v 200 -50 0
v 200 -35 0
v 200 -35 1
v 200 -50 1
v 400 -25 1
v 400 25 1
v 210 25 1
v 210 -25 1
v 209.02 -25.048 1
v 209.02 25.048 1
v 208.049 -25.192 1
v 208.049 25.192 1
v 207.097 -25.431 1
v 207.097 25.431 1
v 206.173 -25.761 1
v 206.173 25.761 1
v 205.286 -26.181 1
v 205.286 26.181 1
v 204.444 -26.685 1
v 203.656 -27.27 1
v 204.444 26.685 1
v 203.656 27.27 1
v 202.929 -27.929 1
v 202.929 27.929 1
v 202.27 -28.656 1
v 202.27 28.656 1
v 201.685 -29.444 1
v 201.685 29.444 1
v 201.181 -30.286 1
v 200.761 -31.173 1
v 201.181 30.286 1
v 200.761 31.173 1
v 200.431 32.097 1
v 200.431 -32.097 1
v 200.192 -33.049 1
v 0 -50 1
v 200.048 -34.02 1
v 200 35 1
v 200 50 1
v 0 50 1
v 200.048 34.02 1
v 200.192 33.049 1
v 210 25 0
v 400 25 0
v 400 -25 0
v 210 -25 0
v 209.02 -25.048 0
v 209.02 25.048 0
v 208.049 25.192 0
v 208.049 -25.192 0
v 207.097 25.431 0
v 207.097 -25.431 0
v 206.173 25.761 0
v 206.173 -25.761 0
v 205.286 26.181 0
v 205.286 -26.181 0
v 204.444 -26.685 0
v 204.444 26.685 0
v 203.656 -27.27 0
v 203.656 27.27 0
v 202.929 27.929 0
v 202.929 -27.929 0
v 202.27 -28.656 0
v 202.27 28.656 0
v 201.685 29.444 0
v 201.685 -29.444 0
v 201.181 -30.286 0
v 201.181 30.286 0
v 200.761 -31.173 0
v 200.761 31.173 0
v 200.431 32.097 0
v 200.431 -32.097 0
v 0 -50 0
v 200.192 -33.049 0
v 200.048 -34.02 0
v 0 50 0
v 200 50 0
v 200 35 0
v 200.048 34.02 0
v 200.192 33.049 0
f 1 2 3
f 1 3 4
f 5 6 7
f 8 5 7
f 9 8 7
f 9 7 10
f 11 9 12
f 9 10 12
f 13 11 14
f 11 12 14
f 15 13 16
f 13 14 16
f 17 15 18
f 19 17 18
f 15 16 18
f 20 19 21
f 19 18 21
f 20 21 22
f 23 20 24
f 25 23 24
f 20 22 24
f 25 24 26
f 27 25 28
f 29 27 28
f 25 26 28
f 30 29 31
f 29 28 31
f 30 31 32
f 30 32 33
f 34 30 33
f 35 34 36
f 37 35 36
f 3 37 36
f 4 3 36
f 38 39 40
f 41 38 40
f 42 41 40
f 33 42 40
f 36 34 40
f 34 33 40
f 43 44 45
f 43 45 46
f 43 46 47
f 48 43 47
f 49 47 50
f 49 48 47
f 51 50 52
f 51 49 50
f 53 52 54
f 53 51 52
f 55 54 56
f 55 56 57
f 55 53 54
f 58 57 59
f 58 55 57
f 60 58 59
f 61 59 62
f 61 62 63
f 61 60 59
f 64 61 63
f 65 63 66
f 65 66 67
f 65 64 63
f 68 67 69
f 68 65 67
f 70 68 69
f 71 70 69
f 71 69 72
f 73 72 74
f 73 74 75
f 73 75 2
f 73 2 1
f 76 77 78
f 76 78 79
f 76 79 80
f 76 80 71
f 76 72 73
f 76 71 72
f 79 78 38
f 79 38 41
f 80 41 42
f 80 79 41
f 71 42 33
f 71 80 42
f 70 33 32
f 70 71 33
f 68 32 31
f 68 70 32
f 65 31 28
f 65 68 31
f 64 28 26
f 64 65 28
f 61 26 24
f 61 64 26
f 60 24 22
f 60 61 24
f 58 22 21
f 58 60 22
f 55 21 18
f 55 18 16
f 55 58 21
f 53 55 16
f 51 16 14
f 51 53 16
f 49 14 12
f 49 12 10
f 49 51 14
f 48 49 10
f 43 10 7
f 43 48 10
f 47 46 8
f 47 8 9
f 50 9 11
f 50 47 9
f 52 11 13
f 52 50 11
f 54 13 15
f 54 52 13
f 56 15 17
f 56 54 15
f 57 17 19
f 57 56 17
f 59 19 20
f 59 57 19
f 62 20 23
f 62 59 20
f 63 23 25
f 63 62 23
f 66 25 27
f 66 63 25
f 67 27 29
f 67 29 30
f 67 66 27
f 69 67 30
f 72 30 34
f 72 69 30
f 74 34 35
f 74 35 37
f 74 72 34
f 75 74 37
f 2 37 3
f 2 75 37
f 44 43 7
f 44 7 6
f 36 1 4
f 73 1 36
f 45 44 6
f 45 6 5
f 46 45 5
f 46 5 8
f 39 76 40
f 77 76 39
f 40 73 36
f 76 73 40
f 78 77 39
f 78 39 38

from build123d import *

# Parameters (mm, degrees)
LINEAR_AUSTRAGEN1_DEPTH = 1


with BuildPart() as part:
    # Skizze1 → Linear austragen1 (new body)
    with BuildSketch(Plane.XY):
        with BuildLine():
            Line((0, 50), (200, 50))
            Line((200, 50), (200, 35))
            ThreePointArc((200, 35), (202.928932188, 27.928932188), (210, 25))
            Line((210, 25), (400, 25))
            Line((400, 25), (400, -25))
            Line((400, -25), (210, -25))
            ThreePointArc((210, -25), (202.928932188, -27.928932188), (200, -35))
            Line((200, -35), (200, -50))
            Line((200, -50), (0, -50))
            Line((0, -50), (0, 50))
        make_face()
    extrude(amount=LINEAR_AUSTRAGEN1_DEPTH)


solid = part.part
